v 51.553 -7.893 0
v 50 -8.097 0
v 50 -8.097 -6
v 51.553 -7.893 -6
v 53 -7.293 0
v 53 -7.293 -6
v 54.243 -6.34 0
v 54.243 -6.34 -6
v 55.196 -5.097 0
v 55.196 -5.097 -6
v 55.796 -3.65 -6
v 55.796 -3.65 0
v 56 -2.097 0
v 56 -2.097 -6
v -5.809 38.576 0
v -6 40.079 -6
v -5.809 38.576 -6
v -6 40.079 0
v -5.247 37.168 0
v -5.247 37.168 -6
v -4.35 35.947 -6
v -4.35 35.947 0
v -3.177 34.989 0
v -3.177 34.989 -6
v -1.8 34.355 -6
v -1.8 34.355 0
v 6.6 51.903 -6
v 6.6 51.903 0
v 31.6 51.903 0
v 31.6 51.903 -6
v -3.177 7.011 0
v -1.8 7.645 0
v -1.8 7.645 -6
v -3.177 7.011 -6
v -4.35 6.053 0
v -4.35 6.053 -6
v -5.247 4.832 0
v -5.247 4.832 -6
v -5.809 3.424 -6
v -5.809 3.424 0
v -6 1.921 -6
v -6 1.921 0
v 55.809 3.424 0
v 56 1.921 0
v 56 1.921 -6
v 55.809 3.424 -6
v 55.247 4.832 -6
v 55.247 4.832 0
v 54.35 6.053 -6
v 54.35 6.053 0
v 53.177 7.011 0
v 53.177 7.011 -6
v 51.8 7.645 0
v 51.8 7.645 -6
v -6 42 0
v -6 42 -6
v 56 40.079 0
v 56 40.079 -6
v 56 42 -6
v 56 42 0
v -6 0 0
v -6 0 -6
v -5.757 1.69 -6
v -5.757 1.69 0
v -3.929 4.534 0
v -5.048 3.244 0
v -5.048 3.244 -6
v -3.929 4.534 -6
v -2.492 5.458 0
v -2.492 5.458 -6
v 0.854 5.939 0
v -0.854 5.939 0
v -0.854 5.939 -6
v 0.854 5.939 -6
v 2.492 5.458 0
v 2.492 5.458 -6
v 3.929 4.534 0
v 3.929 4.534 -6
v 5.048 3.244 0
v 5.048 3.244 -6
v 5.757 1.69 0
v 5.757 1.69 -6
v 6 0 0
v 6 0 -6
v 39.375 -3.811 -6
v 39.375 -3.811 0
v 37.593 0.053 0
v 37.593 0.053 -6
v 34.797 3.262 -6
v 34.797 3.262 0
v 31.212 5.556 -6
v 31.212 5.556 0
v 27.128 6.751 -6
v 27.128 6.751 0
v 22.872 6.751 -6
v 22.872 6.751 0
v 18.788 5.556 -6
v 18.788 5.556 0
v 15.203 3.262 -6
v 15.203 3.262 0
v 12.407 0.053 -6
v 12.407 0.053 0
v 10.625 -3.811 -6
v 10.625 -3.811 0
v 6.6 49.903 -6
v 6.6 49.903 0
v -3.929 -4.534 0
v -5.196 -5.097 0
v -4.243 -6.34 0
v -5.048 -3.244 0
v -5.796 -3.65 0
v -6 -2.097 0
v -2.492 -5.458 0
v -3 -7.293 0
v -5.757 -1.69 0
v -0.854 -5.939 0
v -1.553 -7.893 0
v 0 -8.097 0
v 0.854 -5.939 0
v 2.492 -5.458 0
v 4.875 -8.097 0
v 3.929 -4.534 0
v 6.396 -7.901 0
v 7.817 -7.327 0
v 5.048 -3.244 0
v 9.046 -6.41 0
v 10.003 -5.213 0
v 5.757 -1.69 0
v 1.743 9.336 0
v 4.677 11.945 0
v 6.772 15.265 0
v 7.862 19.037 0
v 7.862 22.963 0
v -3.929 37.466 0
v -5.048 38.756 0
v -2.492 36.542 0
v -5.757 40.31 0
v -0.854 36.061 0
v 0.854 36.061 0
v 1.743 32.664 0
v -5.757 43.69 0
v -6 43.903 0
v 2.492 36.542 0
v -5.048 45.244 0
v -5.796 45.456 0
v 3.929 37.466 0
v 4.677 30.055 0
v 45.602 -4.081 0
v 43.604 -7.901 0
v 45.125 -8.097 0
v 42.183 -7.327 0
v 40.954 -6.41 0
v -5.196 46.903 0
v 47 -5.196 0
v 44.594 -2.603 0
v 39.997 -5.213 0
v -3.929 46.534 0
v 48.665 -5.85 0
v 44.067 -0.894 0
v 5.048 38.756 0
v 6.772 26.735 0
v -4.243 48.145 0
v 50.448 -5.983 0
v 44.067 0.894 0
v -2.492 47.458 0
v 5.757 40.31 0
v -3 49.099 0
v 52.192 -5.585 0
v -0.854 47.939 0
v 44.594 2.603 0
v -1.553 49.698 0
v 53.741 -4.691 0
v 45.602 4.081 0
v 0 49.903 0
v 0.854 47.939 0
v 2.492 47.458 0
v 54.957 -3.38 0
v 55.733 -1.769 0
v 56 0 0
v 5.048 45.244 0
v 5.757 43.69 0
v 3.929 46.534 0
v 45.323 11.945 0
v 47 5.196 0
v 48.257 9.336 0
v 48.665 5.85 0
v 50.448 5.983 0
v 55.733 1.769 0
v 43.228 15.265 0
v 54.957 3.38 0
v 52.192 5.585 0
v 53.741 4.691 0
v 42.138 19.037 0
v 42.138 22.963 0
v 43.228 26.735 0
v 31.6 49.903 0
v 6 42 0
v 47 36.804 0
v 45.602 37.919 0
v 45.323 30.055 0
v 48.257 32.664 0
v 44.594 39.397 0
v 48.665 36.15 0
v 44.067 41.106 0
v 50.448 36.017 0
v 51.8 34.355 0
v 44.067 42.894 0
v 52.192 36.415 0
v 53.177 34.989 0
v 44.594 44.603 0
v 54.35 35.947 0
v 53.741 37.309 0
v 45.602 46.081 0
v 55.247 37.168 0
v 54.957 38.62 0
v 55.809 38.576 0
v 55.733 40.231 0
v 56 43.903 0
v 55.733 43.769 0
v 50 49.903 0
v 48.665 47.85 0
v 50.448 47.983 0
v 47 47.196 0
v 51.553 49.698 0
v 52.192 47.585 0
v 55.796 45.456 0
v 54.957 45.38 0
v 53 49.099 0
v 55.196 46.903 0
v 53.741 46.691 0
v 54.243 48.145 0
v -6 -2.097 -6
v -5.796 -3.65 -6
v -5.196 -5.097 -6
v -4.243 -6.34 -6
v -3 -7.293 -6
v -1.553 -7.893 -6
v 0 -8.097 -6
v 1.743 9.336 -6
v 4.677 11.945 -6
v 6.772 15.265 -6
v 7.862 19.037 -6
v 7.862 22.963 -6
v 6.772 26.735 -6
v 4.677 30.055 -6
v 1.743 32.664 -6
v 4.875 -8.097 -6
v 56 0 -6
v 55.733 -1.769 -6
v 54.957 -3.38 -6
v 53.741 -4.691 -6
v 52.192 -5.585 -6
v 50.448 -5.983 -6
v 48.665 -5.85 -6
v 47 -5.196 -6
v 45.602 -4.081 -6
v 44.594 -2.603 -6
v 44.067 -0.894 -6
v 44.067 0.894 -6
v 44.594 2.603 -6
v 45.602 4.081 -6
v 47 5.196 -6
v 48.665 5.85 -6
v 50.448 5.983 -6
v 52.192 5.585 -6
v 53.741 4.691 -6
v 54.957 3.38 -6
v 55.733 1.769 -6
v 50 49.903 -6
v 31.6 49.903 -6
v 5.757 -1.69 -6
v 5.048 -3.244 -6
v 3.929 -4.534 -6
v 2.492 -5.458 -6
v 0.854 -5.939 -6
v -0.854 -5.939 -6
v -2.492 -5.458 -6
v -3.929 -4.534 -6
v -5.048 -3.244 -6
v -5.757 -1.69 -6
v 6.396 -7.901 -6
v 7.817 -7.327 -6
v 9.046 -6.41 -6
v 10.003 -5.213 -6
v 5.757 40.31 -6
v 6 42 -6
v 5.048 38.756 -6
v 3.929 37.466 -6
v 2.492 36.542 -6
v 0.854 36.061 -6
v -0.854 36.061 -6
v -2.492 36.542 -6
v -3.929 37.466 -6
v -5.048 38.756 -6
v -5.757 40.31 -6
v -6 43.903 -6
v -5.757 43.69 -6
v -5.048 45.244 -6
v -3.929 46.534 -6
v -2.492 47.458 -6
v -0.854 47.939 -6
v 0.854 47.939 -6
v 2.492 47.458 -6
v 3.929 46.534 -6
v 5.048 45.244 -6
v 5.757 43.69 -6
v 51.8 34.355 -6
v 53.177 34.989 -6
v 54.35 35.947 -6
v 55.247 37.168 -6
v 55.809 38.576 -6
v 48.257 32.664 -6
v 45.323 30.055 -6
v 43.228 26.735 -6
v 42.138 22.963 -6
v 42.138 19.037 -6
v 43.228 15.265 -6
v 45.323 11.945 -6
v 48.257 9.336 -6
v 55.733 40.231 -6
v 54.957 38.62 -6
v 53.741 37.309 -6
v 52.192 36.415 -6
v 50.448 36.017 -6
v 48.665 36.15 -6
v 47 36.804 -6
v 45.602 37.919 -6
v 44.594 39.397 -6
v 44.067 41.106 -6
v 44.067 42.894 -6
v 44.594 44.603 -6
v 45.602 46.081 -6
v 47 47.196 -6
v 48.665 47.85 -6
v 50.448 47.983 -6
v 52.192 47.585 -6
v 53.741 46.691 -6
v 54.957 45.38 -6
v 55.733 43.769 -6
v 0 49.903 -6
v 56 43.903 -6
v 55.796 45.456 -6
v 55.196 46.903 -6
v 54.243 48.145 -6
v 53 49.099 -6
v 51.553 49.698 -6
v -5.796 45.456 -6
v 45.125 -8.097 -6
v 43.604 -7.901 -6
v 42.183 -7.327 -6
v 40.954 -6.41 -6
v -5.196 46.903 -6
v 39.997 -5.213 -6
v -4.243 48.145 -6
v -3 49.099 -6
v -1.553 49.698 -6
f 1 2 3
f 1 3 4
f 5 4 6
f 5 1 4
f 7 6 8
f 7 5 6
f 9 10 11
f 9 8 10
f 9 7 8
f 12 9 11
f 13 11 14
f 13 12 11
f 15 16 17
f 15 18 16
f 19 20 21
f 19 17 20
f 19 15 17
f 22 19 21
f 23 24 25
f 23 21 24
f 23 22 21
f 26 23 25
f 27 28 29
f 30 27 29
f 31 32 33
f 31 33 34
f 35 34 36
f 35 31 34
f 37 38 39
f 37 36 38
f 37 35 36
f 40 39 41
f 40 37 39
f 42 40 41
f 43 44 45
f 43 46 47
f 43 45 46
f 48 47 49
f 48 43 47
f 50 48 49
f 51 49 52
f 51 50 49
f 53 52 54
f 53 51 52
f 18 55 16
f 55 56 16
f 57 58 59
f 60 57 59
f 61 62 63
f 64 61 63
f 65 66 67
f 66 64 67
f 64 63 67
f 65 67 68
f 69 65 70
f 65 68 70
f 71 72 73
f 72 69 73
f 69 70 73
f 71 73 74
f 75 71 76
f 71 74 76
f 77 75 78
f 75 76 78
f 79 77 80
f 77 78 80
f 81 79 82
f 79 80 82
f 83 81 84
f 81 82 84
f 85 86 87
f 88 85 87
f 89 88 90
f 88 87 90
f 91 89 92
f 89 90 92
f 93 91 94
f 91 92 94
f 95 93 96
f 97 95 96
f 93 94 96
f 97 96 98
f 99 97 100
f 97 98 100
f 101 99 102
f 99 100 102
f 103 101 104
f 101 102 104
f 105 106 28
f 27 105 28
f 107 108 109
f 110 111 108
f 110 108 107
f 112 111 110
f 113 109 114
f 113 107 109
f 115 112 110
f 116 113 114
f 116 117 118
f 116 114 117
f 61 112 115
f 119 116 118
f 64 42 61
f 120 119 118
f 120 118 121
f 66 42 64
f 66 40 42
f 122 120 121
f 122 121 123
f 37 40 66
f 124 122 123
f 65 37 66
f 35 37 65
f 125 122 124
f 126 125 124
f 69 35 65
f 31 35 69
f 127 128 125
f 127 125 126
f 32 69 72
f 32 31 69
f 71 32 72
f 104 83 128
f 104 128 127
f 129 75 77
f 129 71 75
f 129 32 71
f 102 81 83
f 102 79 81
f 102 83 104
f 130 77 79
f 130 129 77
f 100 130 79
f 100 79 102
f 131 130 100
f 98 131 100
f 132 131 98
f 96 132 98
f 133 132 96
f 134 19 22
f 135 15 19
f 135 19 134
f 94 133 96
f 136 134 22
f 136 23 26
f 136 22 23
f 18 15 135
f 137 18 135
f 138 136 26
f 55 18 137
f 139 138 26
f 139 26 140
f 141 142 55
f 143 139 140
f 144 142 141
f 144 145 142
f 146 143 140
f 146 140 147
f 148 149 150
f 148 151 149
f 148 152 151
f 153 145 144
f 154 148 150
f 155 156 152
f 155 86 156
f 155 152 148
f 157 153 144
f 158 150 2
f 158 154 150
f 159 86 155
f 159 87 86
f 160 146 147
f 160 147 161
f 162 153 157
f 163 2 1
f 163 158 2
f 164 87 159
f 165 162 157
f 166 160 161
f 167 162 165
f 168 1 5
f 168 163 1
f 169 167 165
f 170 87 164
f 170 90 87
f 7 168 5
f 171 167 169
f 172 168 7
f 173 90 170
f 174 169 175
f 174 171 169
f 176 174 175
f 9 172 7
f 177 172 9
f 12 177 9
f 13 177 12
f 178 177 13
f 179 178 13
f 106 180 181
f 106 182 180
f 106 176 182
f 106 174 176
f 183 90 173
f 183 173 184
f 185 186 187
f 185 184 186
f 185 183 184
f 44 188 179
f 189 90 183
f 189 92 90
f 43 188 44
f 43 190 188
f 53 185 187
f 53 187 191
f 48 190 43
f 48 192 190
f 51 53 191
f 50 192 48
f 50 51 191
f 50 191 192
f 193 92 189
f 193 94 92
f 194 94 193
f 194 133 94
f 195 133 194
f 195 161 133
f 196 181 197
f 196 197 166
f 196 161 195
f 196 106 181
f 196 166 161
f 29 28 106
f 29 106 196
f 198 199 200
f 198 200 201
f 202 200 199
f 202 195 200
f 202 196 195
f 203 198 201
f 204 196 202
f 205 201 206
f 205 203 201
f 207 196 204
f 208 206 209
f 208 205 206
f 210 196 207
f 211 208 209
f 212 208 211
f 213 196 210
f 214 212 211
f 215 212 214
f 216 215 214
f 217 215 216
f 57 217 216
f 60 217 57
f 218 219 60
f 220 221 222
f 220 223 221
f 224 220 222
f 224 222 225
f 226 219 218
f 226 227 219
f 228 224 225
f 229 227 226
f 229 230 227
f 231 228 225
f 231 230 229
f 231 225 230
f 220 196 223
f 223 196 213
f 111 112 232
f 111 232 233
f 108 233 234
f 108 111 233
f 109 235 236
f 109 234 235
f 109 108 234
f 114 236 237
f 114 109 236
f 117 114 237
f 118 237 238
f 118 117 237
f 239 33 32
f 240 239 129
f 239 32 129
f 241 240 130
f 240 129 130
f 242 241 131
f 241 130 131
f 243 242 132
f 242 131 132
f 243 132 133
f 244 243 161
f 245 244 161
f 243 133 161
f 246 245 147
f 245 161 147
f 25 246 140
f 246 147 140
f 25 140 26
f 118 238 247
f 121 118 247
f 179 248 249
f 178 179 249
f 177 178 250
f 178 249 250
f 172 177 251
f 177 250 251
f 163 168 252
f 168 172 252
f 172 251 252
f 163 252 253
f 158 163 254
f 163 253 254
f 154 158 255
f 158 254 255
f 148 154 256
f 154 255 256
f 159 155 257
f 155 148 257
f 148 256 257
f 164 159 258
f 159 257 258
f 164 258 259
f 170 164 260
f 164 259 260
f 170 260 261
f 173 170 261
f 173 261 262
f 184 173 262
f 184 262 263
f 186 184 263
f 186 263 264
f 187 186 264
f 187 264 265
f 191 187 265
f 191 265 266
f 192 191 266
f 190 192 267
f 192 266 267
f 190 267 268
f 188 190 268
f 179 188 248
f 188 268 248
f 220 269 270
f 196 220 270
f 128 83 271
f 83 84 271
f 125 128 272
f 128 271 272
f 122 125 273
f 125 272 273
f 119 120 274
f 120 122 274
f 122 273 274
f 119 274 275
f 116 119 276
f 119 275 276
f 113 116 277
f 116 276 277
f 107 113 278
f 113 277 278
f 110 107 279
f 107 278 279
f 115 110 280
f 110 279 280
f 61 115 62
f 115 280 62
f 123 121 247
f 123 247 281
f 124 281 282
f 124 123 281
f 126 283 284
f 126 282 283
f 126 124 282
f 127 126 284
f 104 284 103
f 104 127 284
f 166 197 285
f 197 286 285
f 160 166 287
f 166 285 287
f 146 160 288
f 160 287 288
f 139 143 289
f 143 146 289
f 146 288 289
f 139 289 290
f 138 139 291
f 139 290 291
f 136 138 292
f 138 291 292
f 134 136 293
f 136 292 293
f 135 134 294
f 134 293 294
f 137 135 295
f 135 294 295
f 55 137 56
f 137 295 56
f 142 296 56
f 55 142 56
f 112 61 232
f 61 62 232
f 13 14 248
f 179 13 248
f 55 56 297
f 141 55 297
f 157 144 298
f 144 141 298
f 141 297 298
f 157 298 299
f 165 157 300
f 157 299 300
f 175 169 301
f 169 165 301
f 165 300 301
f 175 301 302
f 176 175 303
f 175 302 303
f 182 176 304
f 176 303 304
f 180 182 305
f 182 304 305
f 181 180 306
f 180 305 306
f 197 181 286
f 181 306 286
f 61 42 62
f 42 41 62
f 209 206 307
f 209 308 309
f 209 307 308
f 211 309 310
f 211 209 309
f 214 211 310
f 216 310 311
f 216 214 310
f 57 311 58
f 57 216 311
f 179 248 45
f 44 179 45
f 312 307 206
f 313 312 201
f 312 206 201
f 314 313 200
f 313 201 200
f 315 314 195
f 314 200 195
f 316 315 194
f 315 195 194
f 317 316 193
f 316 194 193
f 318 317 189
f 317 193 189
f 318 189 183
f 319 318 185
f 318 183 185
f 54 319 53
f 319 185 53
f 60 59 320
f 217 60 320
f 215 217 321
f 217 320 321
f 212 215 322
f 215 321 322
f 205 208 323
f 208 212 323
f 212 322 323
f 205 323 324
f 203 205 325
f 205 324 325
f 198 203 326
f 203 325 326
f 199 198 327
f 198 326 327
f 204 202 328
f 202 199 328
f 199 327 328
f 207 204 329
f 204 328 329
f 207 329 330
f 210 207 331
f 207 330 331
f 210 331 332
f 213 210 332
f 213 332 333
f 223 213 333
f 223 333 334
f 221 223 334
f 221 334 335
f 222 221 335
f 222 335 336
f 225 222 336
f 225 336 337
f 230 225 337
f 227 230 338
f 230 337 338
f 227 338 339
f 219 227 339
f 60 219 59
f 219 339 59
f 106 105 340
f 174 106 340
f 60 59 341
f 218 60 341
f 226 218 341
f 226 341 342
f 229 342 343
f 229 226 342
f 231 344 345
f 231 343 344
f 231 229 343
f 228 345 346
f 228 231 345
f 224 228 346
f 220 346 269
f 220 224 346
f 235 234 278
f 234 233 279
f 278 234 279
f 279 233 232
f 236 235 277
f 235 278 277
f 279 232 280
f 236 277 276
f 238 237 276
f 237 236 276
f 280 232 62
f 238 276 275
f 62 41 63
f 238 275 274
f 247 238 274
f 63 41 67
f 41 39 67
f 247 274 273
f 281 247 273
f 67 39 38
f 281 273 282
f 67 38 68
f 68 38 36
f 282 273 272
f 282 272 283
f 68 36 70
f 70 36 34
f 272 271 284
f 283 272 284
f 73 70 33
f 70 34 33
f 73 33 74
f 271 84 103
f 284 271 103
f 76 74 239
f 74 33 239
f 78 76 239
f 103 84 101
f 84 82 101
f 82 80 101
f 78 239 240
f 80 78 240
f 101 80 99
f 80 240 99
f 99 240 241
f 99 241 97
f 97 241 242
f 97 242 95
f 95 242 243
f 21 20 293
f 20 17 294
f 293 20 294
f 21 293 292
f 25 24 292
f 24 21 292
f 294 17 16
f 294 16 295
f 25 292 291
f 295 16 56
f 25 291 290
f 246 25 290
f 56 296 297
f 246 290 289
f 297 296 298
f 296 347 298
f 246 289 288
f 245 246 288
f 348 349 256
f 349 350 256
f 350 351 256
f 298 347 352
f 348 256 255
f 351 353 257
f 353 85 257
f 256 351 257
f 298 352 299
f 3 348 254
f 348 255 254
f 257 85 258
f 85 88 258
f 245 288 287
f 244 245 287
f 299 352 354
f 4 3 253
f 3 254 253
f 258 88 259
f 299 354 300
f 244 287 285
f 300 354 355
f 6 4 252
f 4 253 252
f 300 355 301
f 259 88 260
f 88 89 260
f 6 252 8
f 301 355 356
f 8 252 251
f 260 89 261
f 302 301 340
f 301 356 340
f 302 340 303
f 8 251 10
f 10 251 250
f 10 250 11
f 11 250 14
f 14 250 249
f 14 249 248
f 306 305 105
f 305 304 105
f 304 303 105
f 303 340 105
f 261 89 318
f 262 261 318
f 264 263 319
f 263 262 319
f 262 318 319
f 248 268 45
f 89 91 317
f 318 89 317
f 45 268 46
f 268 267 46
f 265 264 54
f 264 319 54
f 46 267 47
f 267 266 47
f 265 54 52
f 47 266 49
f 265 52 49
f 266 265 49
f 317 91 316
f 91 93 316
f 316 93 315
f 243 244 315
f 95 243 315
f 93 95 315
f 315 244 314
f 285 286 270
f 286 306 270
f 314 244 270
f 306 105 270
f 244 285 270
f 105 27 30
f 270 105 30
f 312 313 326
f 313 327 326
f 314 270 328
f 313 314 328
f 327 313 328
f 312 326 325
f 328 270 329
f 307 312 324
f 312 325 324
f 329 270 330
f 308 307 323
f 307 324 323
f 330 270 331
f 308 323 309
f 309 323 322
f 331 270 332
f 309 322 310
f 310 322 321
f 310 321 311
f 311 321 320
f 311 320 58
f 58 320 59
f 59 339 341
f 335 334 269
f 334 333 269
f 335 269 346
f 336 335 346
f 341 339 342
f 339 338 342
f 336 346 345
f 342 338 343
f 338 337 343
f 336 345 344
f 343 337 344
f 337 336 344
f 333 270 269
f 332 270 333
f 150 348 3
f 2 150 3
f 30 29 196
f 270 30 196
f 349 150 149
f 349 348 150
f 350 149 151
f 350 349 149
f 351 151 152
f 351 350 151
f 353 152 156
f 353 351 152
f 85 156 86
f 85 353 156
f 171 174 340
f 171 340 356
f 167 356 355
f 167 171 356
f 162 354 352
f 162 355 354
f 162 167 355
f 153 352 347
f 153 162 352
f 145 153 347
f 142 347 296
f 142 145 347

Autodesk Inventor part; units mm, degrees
ref_plane "YZ Plane" through (0, 0, 0) normal (1, 0, 0) x (0, 1, 0)
ref_plane "XZ Plane" through (0, 0, 0) normal (0, 1, 0) x (-1, 0, 0)
ref_plane "Arbeitsebene1" through (0, 0, -6) normal (0, 0, 1) x (1, 0, 0)
sketch "Skizze1" plane through (0, 0, -6) normal (0, 0, 1) x (1, 0, 0)
  circle A0 centre (0, 42) radius 6 projected
  circle A1 centre (50, 42) radius 6 projected
  circle A2 centre (50, 0) radius 6 projected
  circle A3 centre (0, 0) radius 6 projected
  line L0 (6.489, 48.9995) -> (6.489, 49.9028) projected
  line L1 (6.489, 49.9028) -> (-6, 49.9028) projected
  line L2 (-6, 49.9028) -> (-6, -8.0972) projected
  line L3 (-6, -8.0972) -> (5.7305, -8.0972) projected
  line L4 (5.7305, -8.0972) -> (5.7305, -4.6433) projected
  line L5 (5.7305, -4.6433) -> (25.1643, -4.6433) projected
  line L6 (25.1643, -4.6433) -> (13.6183, -0.9927) projected
  line L7 (13.6183, -0.9927) -> (6.9629, 3.2) projected
  line L8 (6.9629, 3.2) -> (-0.5, 23.5649) projected
  line L9 (-0.5, 23.5649) -> (2.346, 34.9379) projected
  line L10 (2.346, 34.9379) -> (18.55, 40.876) projected
  line L11 (18.55, 40.876) -> (19.7446, 48.9995)
  line L12 (19.7446, 48.9995) -> (6.489, 48.9995) projected
  circle A4 centre (0, 42) radius 3.2 projected
  circle A5 centre (0, 0) radius 3.2 projected
  line L13 (-6, -8.0972) -> (56, -8.0972)
  line L14 (56, -8.0972) -> (56, 49.9028)
  line L15 (56, 49.9028) -> (-6, 49.9028)
  line L16 (-6, 49.9028) -> (-6, -8.0972)
  circle A6 centre (25, 19) radius 21 projected
  line L17 (22.1022, 54.5009) -> (31.9971, 38.8) construction
  line L18 (31.9971, 54.5009) -> (22.1022, 38.8) construction
  point P0 (0, 0)
extrude "Extrusion1" add sketch "Skizze1" along normal blind 6 contours L2 L1 L0 L12 L11 L10 L9 L8 L7 L6 L5 L4 L3 | L15 L14 L13 L4 L5 L6 L7 L8 L9 L10 L11 L12 L0 | A6
sketch "Skizze2" plane through (0, 0, 0) normal (0, 0, 1) x (1, 0, 0)
  circle A0 centre (0, 42) radius 6 projected
  circle A1 centre (0, 0) radius 6 projected
  line L0 (56, -8.0972) -> (56, 0) projected
  circle A2 centre (50, 0) radius 6 projected
  line L1 (56, 0) -> (56, 42) projected
  circle A3 centre (50, 42) radius 6 projected
  line L2 (56, 42) -> (56, 49.9028) projected
  line L3 (56, 49.9028) -> (-6, 49.9028) projected
  line L4 (-6, 42) -> (-6, 0) projected
  circle A4 centre (-6, 21) radius 14
  line L5 (56, 0) -> (56, 42) projected
  circle A5 centre (56, 21) radius 14
  line L6 (-6, -8.0972) -> (56, -8.0972) projected
  circle A6 centre (25, -8.0972) radius 15
  line L7 (-6, -8.0972) -> (56, -8.0972) projected
  line L8 (-6, 49.9028) -> (-6, 42) projected
  line L9 (-6, 42) -> (-6, 0) projected
  line L10 (-6, 0) -> (-6, -8.0972) projected
  point P0 (0, 0)
  dimension "d3" = 28
  dimension "d4" = 28
  dimension "d5" = 30
extrude "Extrusion2" cut sketch "Skizze2" against normal blind 6 contours A4 L4 | L4 A4 | A5 L1 | L1 A5 | A6 L6 | L6 A6
fillet "Rundung1" radius 6 10 edges at (56, 35, -3) (56, 7, -3) (56, 49.9028, -3) (56, -8.0972, -3) (40, -8.0972, -3) (10, -8.0972, -3) (-6, -8.0972, -3) (-6, 7, -3) (-6, 35, -3) (-6, 49.9028, -3)
sketch "Skizze4" plane through (0, 0, 0) normal (0, 0, 1) x (1, 0, 0)
  arc A0 (0, 49.9028) -> (-6, 43.9028) centre (0, 43.9028) ccw projected
  line L0 (-6, 43.9028) -> (-6, 42) projected
  circle A1 centre (0, 42) radius 6 projected
  line L1 (-6, 42) -> (-6, 40.0788) projected
  arc A2 (-6, 40.0788) -> (-1.8, 34.3551) centre (0, 40.0788) ccw projected
  arc A3 (-1.8, 7.6449) -> (-1.8, 34.3551) centre (-6, 21) ccw projected
  arc A4 (-1.8, 7.6449) -> (-6, 1.9212) centre (0, 1.9212) ccw projected
  line L2 (-6, 1.9212) -> (-6, 0) projected
  circle A5 centre (0, 0) radius 6 projected
  line L3 (-6, 0) -> (-6, -2.0972) projected
  arc A6 (-6, -2.0972) -> (0, -8.0972) centre (0, -2.0972) ccw projected
  line L4 (0, -8.0972) -> (4.8754, -8.0972) projected
  arc A7 (4.8754, -8.0972) -> (10.6253, -3.8115) centre (4.8754, -2.0972) ccw projected
  arc A8 (39.3747, -3.8115) -> (10.6253, -3.8115) centre (25, -8.0972) ccw projected
  arc A9 (39.3747, -3.8115) -> (45.1246, -8.0972) centre (45.1246, -2.0972) ccw projected
  line L5 (45.1246, -8.0972) -> (50, -8.0972) projected
  arc A10 (50, -8.0972) -> (56, -2.0972) centre (50, -2.0972) ccw projected
  line L6 (56, -2.0972) -> (56, 0) projected
  circle A11 centre (50, 0) radius 6 projected
  line L7 (56, 0) -> (56, 1.9212) projected
  arc A12 (56, 1.9212) -> (51.8, 7.6449) centre (50, 1.9212) ccw projected
  arc A13 (51.8, 34.3551) -> (51.8, 7.6449) centre (56, 21) ccw projected
  arc A14 (51.8, 34.3551) -> (56, 40.0788) centre (50, 40.0788) ccw projected
  line L8 (56, 40.0788) -> (56, 42) projected
  circle A15 centre (50, 42) radius 6 projected
  line L9 (56, 42) -> (56, 43.9028) projected
  arc A16 (56, 43.9028) -> (50, 49.9028) centre (50, 43.9028) ccw projected
  line L10 (50, 49.9028) -> (0, 49.9028) projected
  line L11 (6.6, 89.7038) -> (6.6, 65.7038) projected
  line L12 (6.6, 65.7038) -> (31.6, 65.7038) projected
  line L13 (31.6, 65.7038) -> (31.6, 89.7038) projected
  line L14 (31.6, 89.7038) -> (6.6, 89.7038) projected
  circle A17 centre (29.6, 87.7038) radius 1.05 projected
  circle A18 centre (29.6, 75.2038) radius 1.05 projected
  circle A19 centre (8.6, 75.2038) radius 1.05 projected
  circle A20 centre (8.6, 87.7038) radius 1.05 projected
  line L15 (27.8, 85.1038) -> (26.58, 85.1038) projected
  line L16 (27.8, 84.3038) -> (27.8, 85.1038) projected
  line L17 (26.58, 84.3038) -> (27.8, 84.3038) projected
  line L18 (26.58, 85.1038) -> (26.58, 84.3038) projected
  line L19 (50, 49.9028) -> (0, 49.9028) projected
  line L20 (31.6, 49.9028) -> (6.6, 49.9028)
  line L21 (6.6, 49.9028) -> (6.6, 51.9028)
  line L22 (6.6, 51.9028) -> (31.6, 51.9028)
  line L23 (31.6, 51.9028) -> (31.6, 49.9028)
  point P0 (0, 0)
  dimension "d13" = 2
extrude "Extrusion4" add sketch "Skizze4" against normal blind 6 contours L21 L22 L23 L10
properties part number "20_Schlitten"
